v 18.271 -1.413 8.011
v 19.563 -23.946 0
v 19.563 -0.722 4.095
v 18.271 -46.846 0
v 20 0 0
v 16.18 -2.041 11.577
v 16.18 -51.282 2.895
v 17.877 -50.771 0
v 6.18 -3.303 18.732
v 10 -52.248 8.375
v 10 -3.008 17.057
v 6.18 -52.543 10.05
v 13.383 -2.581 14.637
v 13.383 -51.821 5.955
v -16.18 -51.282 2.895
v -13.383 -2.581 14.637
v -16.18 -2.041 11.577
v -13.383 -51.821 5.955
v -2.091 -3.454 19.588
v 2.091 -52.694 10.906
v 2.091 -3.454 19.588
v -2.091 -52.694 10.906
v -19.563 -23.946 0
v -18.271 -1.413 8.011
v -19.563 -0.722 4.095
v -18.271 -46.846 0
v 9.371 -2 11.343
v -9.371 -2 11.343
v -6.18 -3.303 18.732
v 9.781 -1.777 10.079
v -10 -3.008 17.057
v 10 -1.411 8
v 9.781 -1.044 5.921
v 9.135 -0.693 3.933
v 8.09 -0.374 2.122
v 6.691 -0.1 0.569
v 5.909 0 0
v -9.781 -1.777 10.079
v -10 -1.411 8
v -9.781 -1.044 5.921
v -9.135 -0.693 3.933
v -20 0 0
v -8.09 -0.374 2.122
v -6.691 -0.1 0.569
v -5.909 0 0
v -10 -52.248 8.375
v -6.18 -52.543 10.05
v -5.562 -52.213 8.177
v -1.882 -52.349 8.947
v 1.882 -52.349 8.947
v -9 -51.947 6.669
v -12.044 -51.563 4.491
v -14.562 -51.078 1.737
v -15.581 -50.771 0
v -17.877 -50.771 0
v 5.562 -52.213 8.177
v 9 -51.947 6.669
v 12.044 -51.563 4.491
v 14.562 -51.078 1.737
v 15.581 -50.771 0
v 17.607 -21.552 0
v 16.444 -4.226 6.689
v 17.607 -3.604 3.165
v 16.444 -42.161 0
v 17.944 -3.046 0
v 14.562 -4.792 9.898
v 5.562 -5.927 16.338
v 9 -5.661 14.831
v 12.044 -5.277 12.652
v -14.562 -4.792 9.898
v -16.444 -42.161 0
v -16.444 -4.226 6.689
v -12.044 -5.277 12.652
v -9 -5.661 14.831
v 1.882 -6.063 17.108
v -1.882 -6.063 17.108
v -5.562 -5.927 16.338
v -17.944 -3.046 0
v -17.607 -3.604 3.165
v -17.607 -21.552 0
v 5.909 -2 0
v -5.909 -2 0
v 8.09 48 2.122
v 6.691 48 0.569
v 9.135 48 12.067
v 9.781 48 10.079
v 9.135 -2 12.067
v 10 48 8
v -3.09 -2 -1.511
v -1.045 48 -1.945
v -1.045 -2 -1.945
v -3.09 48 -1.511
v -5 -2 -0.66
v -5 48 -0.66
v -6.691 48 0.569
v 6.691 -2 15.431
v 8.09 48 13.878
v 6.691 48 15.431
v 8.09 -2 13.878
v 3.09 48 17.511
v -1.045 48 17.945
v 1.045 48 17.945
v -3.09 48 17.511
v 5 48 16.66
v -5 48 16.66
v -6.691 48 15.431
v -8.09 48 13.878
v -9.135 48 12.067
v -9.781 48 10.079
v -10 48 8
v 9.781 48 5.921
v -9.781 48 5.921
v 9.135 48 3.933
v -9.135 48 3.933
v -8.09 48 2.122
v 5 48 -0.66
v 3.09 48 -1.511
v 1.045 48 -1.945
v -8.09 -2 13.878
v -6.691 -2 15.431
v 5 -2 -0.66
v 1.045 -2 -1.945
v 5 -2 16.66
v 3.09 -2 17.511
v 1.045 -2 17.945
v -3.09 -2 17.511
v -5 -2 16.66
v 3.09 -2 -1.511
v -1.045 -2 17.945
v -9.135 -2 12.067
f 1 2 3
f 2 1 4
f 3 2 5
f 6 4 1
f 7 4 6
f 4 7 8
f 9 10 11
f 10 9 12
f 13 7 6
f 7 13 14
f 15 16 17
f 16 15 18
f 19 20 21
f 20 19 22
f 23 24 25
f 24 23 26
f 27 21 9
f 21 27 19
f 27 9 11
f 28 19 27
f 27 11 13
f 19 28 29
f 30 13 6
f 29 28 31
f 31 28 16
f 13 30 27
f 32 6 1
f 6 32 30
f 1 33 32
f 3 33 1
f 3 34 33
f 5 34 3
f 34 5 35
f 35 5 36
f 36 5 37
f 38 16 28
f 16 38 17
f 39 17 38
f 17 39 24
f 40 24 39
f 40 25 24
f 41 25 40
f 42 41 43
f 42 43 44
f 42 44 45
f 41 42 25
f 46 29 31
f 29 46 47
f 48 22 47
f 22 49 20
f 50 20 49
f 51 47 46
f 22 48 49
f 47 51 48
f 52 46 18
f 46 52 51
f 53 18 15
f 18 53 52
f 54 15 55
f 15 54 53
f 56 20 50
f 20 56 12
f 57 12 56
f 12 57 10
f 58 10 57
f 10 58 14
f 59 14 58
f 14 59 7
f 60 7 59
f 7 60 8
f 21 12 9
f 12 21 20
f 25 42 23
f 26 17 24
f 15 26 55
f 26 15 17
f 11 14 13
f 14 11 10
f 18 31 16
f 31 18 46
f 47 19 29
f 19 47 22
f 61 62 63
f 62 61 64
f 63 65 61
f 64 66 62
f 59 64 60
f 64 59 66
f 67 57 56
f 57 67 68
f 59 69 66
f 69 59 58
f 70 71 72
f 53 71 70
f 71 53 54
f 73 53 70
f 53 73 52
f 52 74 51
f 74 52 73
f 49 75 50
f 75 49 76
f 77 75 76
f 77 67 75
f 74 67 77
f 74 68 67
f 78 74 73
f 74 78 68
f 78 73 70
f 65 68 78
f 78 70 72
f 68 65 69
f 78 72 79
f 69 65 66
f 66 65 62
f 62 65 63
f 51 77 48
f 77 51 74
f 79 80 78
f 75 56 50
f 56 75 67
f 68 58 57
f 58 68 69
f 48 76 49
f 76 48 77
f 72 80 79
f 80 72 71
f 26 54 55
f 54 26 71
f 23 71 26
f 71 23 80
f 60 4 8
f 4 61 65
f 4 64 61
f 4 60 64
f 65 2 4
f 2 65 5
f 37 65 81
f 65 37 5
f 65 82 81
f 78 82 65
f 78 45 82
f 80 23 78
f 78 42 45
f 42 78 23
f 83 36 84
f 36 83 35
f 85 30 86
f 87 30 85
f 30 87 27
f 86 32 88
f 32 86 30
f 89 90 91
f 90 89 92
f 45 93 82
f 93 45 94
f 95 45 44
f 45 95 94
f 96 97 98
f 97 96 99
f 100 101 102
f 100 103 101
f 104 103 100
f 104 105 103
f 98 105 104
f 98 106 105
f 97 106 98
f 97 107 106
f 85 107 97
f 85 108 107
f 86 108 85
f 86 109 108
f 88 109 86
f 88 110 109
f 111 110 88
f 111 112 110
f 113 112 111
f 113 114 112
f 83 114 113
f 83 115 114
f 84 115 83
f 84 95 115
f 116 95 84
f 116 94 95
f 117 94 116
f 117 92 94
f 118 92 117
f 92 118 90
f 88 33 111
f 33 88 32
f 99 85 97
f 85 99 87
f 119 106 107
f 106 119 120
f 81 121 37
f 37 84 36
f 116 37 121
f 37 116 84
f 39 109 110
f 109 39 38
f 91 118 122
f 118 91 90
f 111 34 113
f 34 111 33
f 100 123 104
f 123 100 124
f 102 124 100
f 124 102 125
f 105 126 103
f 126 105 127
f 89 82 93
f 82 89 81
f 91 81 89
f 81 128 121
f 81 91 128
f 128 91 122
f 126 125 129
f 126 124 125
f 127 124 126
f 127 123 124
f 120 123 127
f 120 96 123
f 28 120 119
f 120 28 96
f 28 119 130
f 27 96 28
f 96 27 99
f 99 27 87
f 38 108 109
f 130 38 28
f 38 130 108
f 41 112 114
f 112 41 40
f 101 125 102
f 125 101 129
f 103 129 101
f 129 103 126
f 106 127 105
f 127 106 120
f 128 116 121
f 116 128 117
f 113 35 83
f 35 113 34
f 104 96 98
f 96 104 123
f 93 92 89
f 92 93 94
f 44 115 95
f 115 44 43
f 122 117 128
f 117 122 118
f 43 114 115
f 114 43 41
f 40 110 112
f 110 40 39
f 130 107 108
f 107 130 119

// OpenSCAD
frontRadius=20;
thickness=2;
frontLength=50;

backRadius=10;
backLength=50;

cutBottomPlate = 500;

difference() {
    rotate([100, 0, 0]) {
        difference() {
            cylinder(frontLength, r=frontRadius);
            translate([0, 0, thickness + 1]) cylinder(frontLength-thickness, r=frontRadius-thickness);
        }
    }
    translate([-cutBottomPlate / 2, -cutBottomPlate / 2, -cutBottomPlate]) cube(cutBottomPlate, cutBottomPlate, cutBottomPlate);
}

translate([0, backLength-thickness, backRadius-thickness]) rotate([90, 0, 0]) cylinder(backLength, r=backRadius);
